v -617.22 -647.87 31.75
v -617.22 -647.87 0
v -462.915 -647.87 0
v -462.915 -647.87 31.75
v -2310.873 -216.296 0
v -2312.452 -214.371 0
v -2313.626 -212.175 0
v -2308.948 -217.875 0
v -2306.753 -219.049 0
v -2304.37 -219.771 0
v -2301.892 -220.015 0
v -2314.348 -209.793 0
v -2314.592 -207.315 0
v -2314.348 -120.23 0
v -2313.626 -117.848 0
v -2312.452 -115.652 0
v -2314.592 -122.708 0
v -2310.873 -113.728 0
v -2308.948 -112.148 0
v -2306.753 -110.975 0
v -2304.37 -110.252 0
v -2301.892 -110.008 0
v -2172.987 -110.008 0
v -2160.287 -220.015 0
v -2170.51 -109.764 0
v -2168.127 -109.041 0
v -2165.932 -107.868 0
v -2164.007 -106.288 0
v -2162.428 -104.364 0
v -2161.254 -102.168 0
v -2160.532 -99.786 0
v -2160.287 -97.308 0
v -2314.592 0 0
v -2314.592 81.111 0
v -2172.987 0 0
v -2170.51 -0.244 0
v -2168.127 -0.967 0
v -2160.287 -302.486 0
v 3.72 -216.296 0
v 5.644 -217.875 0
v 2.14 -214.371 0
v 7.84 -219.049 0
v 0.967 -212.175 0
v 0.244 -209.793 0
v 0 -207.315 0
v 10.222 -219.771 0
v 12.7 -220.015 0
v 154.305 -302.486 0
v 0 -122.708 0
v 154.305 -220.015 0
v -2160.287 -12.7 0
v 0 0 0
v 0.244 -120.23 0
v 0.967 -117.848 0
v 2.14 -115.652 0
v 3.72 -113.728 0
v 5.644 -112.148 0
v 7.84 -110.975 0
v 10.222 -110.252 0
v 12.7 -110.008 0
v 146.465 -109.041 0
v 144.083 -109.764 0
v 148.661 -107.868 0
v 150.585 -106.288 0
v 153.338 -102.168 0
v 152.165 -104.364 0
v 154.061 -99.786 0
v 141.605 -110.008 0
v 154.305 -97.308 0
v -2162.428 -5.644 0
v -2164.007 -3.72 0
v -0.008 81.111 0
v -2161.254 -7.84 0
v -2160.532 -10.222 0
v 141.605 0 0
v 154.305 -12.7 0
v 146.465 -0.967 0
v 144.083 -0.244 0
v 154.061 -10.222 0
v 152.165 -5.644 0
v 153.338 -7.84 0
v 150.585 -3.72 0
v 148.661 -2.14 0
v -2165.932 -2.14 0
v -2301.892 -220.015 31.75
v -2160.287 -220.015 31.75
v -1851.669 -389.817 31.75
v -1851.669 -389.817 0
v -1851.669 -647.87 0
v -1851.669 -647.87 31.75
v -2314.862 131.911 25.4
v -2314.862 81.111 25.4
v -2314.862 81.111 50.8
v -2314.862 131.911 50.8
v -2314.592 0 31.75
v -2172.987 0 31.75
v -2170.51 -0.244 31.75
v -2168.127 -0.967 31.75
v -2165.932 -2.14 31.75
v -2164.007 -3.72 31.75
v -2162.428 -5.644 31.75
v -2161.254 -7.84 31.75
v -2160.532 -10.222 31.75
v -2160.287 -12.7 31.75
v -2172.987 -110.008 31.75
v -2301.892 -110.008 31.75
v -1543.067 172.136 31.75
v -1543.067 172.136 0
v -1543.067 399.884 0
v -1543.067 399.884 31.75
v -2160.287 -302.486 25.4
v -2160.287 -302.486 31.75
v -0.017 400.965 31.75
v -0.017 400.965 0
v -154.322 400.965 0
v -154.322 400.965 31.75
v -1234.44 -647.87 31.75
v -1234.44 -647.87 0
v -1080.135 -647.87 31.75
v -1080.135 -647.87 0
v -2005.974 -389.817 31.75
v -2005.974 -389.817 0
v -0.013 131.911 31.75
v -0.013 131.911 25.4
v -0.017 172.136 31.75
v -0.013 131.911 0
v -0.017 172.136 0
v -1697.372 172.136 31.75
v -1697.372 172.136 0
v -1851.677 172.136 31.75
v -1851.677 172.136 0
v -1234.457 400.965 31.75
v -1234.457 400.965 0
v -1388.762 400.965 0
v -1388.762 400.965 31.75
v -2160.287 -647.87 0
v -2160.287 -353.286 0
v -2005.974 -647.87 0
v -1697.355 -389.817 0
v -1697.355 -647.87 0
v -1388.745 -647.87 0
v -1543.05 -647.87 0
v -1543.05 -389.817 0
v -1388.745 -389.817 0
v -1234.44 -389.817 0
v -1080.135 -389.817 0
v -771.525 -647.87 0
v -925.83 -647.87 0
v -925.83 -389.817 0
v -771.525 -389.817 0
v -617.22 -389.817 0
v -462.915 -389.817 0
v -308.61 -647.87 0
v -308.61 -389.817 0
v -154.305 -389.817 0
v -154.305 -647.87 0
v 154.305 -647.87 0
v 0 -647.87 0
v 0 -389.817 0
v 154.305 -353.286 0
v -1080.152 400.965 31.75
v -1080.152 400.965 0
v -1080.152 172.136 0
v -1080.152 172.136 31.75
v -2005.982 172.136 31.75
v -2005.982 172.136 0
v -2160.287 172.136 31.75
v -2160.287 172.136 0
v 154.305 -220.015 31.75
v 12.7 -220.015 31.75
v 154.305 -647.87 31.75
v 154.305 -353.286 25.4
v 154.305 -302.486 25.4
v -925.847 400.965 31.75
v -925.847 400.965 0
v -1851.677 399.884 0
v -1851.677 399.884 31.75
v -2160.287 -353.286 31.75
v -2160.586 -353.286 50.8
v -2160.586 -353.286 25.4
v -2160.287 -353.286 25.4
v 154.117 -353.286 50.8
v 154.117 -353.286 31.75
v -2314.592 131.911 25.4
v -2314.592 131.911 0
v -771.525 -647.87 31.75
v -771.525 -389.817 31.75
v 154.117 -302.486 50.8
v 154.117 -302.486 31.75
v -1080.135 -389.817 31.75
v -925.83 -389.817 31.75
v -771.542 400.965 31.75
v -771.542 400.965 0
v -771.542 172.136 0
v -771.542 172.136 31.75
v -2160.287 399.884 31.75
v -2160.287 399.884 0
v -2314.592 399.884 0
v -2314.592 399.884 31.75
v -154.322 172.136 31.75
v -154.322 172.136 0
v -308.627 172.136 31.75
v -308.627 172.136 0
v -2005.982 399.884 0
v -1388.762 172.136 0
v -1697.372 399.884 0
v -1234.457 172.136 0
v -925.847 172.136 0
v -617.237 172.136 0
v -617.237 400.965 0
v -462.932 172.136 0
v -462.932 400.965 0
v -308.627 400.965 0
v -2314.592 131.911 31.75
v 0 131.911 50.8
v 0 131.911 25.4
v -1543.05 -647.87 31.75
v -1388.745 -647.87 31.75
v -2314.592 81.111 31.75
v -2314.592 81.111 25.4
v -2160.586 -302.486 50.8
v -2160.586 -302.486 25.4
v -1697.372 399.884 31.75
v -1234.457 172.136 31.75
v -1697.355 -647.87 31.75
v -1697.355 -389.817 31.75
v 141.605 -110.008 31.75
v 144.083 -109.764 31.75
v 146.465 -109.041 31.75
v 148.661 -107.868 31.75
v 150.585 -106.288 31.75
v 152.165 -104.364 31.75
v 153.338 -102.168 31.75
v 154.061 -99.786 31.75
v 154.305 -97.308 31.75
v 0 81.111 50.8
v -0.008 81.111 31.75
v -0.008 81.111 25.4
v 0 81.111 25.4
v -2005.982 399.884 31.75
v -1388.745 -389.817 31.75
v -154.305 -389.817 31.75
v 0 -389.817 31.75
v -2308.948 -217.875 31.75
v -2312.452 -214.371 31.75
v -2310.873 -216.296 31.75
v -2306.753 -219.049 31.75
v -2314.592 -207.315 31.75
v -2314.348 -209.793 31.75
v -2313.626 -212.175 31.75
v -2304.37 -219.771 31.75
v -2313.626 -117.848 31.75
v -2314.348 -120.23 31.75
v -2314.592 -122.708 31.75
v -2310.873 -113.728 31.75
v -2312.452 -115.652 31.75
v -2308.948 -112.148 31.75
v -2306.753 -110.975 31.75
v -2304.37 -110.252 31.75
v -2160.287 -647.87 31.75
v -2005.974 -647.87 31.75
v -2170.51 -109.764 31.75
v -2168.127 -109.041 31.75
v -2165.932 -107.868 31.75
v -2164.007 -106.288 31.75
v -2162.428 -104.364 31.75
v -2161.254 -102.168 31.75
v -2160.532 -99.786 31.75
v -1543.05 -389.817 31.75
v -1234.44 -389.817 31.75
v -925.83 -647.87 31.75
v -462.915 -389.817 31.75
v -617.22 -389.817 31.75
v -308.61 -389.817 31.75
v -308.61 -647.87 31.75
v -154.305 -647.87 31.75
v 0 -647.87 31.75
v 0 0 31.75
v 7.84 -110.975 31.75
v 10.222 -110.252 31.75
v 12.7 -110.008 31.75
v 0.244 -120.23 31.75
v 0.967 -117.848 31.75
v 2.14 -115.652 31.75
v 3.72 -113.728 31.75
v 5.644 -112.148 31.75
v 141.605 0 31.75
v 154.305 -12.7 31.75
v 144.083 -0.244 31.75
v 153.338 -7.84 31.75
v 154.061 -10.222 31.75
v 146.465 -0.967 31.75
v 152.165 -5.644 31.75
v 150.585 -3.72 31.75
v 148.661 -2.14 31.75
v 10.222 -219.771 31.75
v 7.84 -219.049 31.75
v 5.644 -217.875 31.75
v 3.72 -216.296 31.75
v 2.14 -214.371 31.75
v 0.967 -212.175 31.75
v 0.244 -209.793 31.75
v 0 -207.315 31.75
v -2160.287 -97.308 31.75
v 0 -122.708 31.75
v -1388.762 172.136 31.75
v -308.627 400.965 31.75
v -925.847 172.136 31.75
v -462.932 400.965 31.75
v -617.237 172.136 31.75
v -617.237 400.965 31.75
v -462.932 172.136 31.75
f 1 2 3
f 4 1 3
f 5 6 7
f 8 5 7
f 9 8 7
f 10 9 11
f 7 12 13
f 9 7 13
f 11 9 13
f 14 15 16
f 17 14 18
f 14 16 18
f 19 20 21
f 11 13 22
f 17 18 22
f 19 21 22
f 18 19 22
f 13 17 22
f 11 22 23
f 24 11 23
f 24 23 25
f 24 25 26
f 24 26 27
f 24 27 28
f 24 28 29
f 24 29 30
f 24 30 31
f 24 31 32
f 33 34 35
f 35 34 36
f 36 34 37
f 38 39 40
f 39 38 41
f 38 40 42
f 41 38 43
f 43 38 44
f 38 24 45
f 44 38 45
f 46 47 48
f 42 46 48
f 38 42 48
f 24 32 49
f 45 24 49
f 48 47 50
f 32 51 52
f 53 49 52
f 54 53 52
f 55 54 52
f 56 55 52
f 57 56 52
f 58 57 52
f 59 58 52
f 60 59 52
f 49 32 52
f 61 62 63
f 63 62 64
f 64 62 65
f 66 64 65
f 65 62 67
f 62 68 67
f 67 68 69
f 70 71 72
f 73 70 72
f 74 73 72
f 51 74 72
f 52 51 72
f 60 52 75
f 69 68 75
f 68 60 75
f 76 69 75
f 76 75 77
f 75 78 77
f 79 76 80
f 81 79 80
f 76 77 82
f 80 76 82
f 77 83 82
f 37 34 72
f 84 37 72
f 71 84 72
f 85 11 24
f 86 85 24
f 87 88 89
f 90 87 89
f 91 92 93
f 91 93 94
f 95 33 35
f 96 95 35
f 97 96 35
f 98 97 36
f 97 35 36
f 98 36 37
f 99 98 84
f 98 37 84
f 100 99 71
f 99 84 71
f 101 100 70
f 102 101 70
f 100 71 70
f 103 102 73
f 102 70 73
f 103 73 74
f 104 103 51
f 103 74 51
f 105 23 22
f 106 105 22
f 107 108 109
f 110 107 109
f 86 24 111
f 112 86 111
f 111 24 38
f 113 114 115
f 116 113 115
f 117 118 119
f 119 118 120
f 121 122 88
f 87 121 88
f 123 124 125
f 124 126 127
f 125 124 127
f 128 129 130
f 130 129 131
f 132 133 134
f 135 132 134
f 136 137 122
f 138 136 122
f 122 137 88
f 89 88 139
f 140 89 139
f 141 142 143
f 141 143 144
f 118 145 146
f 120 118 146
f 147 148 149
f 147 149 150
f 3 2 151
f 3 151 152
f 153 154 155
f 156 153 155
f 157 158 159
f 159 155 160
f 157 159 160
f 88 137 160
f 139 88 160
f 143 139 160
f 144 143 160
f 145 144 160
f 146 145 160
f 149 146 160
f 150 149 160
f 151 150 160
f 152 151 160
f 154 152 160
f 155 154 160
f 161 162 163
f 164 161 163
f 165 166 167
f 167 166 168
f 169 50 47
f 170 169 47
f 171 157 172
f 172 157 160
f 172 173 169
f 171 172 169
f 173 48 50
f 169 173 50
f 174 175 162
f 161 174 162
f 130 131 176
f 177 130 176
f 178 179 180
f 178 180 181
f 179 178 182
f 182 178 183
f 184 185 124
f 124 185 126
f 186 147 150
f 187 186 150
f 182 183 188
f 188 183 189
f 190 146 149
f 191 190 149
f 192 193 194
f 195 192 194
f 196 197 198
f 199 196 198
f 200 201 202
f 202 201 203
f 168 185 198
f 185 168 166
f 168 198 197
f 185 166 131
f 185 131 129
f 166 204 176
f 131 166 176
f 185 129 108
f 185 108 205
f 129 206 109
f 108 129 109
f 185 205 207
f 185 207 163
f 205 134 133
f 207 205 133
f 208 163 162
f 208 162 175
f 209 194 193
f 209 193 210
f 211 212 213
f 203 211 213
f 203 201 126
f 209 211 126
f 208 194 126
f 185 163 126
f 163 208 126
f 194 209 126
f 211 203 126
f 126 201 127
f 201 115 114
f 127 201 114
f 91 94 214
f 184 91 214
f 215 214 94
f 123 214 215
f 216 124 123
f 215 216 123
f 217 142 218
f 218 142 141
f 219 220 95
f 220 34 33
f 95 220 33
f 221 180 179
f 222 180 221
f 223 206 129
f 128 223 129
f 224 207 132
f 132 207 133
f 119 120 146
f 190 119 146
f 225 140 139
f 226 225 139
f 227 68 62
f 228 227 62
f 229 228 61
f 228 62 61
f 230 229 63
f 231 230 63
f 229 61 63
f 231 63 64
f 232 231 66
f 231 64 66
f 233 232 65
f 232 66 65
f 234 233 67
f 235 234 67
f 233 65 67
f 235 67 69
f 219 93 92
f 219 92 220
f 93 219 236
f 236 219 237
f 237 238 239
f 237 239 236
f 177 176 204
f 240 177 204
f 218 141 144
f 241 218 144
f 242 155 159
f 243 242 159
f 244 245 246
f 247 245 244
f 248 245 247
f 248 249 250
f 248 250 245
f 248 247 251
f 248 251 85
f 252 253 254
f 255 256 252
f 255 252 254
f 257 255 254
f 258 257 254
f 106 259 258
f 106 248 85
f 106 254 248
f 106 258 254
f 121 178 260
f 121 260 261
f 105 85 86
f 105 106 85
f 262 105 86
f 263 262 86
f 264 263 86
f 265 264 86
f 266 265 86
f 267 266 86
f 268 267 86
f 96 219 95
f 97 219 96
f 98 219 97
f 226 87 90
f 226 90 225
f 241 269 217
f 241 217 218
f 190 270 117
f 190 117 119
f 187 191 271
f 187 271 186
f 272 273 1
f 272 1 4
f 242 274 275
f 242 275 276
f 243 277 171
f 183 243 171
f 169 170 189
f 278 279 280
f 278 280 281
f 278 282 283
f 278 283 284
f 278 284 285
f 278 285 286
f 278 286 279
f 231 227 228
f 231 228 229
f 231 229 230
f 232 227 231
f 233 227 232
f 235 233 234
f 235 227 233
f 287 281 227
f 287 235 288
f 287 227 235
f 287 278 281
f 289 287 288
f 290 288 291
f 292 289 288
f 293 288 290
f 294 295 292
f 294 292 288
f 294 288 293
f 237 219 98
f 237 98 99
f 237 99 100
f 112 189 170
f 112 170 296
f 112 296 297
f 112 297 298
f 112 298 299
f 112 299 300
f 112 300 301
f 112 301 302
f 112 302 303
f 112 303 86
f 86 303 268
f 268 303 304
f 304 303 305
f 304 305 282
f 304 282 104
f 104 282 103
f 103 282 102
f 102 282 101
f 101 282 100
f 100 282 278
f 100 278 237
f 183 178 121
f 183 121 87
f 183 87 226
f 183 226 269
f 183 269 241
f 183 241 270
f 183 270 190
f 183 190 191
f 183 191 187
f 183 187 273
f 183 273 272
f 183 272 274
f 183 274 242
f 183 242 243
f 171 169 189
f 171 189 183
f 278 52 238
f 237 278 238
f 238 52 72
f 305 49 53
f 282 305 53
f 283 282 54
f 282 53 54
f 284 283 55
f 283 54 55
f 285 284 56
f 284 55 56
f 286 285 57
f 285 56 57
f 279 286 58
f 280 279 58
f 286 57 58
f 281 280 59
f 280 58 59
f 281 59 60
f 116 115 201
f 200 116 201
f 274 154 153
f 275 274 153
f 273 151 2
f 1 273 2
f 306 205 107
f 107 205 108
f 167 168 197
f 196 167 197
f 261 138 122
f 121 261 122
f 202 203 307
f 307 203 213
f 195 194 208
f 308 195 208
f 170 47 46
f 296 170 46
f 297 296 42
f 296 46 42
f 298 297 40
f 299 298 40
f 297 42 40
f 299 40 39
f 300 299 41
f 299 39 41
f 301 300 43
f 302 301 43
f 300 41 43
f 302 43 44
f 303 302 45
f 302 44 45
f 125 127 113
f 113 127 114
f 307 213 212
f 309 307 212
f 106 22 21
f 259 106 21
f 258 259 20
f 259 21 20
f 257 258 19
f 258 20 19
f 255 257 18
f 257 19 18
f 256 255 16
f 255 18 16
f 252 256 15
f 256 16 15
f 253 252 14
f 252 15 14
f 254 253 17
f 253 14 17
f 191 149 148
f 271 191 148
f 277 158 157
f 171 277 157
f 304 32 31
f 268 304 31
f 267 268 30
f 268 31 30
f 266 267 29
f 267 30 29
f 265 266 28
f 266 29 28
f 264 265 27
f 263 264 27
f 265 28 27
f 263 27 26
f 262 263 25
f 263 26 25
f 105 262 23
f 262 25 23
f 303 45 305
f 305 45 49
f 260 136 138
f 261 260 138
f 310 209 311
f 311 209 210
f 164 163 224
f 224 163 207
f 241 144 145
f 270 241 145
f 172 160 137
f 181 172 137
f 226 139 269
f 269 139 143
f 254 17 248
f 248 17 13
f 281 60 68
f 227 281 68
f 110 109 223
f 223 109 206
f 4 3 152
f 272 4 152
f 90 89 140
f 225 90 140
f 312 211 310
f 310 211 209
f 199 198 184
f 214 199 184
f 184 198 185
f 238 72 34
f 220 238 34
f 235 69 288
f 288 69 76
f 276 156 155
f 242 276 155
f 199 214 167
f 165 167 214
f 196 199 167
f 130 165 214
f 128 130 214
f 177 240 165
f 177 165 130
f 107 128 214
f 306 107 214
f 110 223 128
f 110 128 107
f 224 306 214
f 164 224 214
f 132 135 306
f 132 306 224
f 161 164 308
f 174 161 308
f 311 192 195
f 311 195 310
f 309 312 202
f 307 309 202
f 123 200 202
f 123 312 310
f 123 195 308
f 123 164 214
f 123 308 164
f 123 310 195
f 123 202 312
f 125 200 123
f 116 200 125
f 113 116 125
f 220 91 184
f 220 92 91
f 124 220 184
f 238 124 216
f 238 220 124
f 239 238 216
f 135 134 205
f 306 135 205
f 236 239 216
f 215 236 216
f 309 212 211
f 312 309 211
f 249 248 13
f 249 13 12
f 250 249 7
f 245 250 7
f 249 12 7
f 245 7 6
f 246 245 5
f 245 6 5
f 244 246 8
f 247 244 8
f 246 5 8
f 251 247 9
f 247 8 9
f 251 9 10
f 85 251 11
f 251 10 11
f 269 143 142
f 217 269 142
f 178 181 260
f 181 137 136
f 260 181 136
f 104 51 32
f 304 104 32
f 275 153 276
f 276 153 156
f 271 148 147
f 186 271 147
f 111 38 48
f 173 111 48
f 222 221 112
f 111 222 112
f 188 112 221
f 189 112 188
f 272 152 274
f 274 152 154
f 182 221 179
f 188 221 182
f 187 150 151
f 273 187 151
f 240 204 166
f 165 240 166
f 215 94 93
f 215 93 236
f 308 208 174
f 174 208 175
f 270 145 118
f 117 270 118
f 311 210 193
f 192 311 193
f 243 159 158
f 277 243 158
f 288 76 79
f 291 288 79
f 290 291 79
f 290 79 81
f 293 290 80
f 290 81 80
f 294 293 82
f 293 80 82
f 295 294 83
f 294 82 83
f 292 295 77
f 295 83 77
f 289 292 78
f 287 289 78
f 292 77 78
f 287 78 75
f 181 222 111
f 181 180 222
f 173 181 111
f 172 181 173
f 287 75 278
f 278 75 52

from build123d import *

# Parameters (mm, degrees)
F2_DEPTH = 31.75
F1_W     = 2314.8620128632
F1_H     = 50.8
F1_W_2   = 2314.7030770779
F3_DEPTH = 50.8
F5_DEPTH = 25.4


with BuildPart() as f2:
    # F0 (on Top) → F2 (new body)
    with BuildSketch(Plane.XY):
        with BuildLine():
            Line((141.605, 0), (0, 0))
            Line((0, 0), (-0.0174862289, 172.1356511116))
            Line((-0.0174862289, 172.1356511116), (-0.0174862289, 400.9649455547))
            Line((-0.0174862289, 400.9649455547), (-154.3224862289, 400.9649455547))
            Line((-154.3224862289, 400.9649455547), (-154.3224862289, 172.1356511116))
            Line((-154.3224862289, 172.1356511116), (-308.6274862289, 172.1356511116))
            Line((-308.6274862289, 172.1356511116), (-308.6274862289, 400.9649455547))
            Line((-308.6274862289, 400.9649455547), (-462.9324862289, 400.9649455547))
            Line((-462.9324862289, 400.9649455547), (-462.9324862289, 172.1356511116))
            Line((-462.9324862289, 172.1356511116), (-617.2374862289, 172.1356511116))
            Line((-617.2374862289, 172.1356511116), (-617.2374862289, 400.9649455547))
            Line((-617.2374862289, 400.9649455547), (-771.5424862289, 400.9649455547))
            Line((-771.5424862289, 400.9649455547), (-771.5424862289, 172.1356511116))
            Line((-771.5424862289, 172.1356511116), (-925.8474862289, 172.1356511116))
            Line((-925.8474862289, 172.1356511116), (-925.8474862289, 400.9649455547))
            Line((-925.8474862289, 400.9649455547), (-1080.1524862289, 400.9649455547))
            Line((-1080.1524862289, 400.9649455547), (-1080.1524862289, 172.1356511116))
            Line((-1080.1524862289, 172.1356511116), (-1234.4574862289, 172.1356511116))
            Line((-1234.4574862289, 172.1356511116), (-1234.4574862289, 400.9649455547))
            Line((-1234.4574862289, 400.9649455547), (-1388.7624862289, 400.9649455547))
            Line((-1388.7624862289, 400.9649455547), (-1388.7624862289, 172.1356511116))
            Line((-1388.7624862289, 172.1356511116), (-1543.0674862289, 172.1356511116))
            Line((-1543.0674862289, 172.1356511116), (-1543.0674862289, 399.8836874962))
            Line((-1543.0674862289, 399.8836874962), (-1697.3724862289, 399.8836874962))
            Line((-1697.3724862289, 399.8836874962), (-1697.3724862289, 172.1356511116))
            Line((-1697.3724862289, 172.1356511116), (-1851.6774862289, 172.1356511116))
            Line((-1851.6774862289, 172.1356511116), (-1851.6774862289, 399.8836874962))
            Line((-1851.6774862289, 399.8836874962), (-2005.9824862289, 399.8836874962))
            Line((-2005.9824862289, 399.8836874962), (-2005.9824862289, 172.1356511116))
            Line((-2005.9824862289, 172.1356511116), (-2160.2874862289, 172.1356511116))
            Line((-2160.2874862289, 172.1356511116), (-2160.2874862289, 399.8836874962))
            Line((-2160.2874862289, 399.8836874962), (-2314.5924862289, 399.8836874962))
            Line((-2314.5924862289, 399.8836874962), (-2314.5924862289, 0))
            Line((-2314.5924862289, 0), (-2172.9874862289, 0))
            ThreePointArc((-2172.9874862289, 0), (-2164.0072301079, -3.7197438789), (-2160.2874862289, -12.7))
            Line((-2160.2874862289, -12.7), (-2160.2874862289, -97.307886156))
            ThreePointArc((-2160.2874862289, -97.307886156), (-2164.0072301079, -106.2881422771), (-2172.9874862289, -110.007886156))
            Line((-2172.9874862289, -110.007886156), (-2301.8924862289, -110.007886156))
            ThreePointArc((-2301.8924862289, -110.007886156), (-2310.87274235, -113.7276300349), (-2314.5924862289, -122.707886156))
            Line((-2314.5924862289, -122.707886156), (-2314.5924862289, -207.315286156))
            ThreePointArc((-2314.5924862289, -207.315286156), (-2310.87274235, -216.2955422771), (-2301.8924862289, -220.015286156))
            Line((-2301.8924862289, -220.015286156), (-2160.2874862289, -220.015286156))
            Line((-2160.2874862289, -220.015286156), (-2160.2874862289, -647.8700637817))
            Line((-2160.2874862289, -647.8700637817), (-2005.9736835098, -647.8700637817))
            Line((-2005.9736835098, -647.8700637817), (-2005.9736835098, -389.8174464703))
            Line((-2005.9736835098, -389.8174464703), (-1851.6686835098, -389.8174464703))
            Line((-1851.6686835098, -389.8174464703), (-1851.6686835098, -647.8700637817))
            Line((-1851.6686835098, -647.8700637817), (-1697.355, -647.8700637817))
            Line((-1697.355, -647.8700637817), (-1697.355, -389.8174464703))
            Line((-1697.355, -389.8174464703), (-1543.05, -389.8174464703))
            Line((-1543.05, -389.8174464703), (-1543.05, -647.8700637817))
            Line((-1543.05, -647.8700637817), (-1388.745, -647.8700637817))
            Line((-1388.745, -647.8700637817), (-1388.745, -389.8174464703))
            Line((-1388.745, -389.8174464703), (-1234.44, -389.8174464703))
            Line((-1234.44, -389.8174464703), (-1234.44, -647.8700637817))
            Line((-1234.44, -647.8700637817), (-1080.135, -647.8700637817))
            Line((-1080.135, -647.8700637817), (-1080.135, -389.8174464703))
            Line((-1080.135, -389.8174464703), (-925.83, -389.8174464703))
            Line((-925.83, -389.8174464703), (-925.83, -647.8700637817))
            Line((-925.83, -647.8700637817), (-771.525, -647.8700637817))
            Line((-771.525, -647.8700637817), (-771.525, -389.8174464703))
            Line((-771.525, -389.8174464703), (-617.22, -389.8174464703))
            Line((-617.22, -389.8174464703), (-617.22, -647.8700637817))
            Line((-617.22, -647.8700637817), (-462.915, -647.8700637817))
            Line((-462.915, -647.8700637817), (-462.915, -389.8174464703))
            Line((-462.915, -389.8174464703), (-308.61, -389.8174464703))
            Line((-308.61, -389.8174464703), (-308.61, -647.8700637817))
            Line((-308.61, -647.8700637817), (-154.305, -647.8700637817))
            Line((-154.305, -647.8700637817), (-154.305, -389.8174464703))
            Line((-154.305, -389.8174464703), (0, -389.8174464703))
            Line((0, -389.8174464703), (0, -647.8700637817))
            Line((0, -647.8700637817), (154.305, -647.8700637817))
            Line((154.305, -647.8700637817), (154.305, -220.015286156))
            Line((154.305, -220.015286156), (12.7, -220.015286156))
            ThreePointArc((12.7, -220.015286156), (3.7197438789, -216.2955422771), (0, -207.315286156))
            Line((0, -207.315286156), (0, -122.707886156))
            ThreePointArc((0, -122.707886156), (3.7197438789, -113.7276300349), (12.7, -110.007886156))
            Line((12.7, -110.007886156), (141.605, -110.007886156))
            ThreePointArc((141.605, -110.007886156), (150.5852561211, -106.2881422771), (154.305, -97.307886156))
            Line((154.305, -97.307886156), (154.305, -12.7))
            ThreePointArc((154.305, -12.7), (150.5852561211, -3.7197438789), (141.605, 0))
        make_face()
    extrude(amount=F2_DEPTH)

    # F1 (on face) → F3 (join)
    with BuildSketch(Plane.XY):
        with Locations((-1157.4310064316, 106.5107680202)):
            Rectangle(F1_W, F1_H)
        with Locations((-1003.2348185778, -327.8856937885)):
            Rectangle(F1_W_2, F1_H)
    extrude(amount=F3_DEPTH)

    # F4 (on face) → F5 (cut)
    with BuildSketch(Plane(origin=(0, 0, 0), x_dir=(1, 0, 0), z_dir=(0, 0, -1))):
        Polygon((-2314.8620128632, -131.9107680202), (-2314.5924862289, -131.9107680202), (-0.0134000242, -131.9107680202), (0, -131.9107680202), (0, -81.1107680202), (-0.0082395567, -81.1107680202), (-2314.5924862289, -81.1107680202), (-2314.8620128632, -81.1107680202), align=None)
        Polygon((-2160.5863571167, 302.4856937885), (-2160.2874862289, 302.4856937885), (154.305, 302.4856937885), (154.305, 353.2856937885), (-2160.2874862289, 353.2856937885), (-2160.5863571167, 353.2856937885), align=None)
    extrude(amount=-F5_DEPTH, mode=Mode.SUBTRACT)


solid = f2.part
